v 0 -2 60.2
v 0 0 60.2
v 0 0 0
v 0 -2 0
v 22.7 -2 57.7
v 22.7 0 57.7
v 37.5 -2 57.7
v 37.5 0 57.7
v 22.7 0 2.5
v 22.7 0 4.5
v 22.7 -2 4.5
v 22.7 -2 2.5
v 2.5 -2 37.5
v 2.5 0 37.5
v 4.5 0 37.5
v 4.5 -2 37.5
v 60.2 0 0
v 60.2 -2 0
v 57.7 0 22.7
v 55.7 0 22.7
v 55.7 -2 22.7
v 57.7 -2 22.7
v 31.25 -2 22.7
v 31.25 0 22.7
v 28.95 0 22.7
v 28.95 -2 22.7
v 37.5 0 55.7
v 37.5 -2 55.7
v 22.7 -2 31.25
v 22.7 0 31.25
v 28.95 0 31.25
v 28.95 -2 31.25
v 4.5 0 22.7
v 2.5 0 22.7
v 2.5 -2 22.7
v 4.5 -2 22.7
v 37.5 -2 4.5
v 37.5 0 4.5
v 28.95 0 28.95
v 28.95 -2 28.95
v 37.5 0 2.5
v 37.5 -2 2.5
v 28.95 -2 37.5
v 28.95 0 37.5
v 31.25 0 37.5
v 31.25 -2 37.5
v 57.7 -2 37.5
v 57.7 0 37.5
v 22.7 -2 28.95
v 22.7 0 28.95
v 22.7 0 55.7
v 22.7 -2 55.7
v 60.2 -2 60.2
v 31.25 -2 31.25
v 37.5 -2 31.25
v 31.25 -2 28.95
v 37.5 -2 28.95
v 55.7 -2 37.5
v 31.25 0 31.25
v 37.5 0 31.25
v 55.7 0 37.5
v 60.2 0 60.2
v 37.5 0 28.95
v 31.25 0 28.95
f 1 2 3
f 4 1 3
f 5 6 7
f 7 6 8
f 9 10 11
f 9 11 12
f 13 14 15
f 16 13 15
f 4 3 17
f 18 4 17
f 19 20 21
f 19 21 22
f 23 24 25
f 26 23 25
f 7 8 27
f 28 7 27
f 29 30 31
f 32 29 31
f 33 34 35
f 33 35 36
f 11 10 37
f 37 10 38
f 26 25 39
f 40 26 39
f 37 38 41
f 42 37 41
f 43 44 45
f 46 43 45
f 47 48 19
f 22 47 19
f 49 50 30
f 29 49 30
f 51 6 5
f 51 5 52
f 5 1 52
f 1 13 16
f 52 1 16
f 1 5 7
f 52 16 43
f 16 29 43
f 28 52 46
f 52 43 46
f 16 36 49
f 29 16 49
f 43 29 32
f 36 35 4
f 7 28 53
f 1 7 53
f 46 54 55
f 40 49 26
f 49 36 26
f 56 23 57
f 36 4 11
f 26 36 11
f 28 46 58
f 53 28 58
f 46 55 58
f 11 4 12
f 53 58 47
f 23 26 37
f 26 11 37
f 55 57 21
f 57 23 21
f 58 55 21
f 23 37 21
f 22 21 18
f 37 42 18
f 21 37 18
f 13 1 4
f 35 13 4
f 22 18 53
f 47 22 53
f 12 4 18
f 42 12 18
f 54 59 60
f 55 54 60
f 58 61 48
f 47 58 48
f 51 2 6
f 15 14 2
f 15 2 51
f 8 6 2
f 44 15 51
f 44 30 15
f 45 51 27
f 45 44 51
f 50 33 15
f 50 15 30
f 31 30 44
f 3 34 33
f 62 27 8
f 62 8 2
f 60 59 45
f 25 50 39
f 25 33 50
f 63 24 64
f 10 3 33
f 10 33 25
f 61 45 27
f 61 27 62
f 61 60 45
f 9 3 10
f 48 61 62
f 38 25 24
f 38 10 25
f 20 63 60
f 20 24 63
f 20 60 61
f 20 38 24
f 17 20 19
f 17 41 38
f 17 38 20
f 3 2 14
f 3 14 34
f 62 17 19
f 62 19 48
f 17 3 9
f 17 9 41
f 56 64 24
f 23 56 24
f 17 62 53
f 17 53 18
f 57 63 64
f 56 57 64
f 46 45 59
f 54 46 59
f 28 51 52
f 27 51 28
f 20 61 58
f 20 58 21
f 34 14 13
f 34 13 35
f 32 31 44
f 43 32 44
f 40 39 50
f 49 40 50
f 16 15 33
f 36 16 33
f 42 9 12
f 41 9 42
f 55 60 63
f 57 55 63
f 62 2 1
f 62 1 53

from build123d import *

# Parameters (mm, degrees)
CROQUIS1_W              = 60.2
CROQUIS1_H              = 60.2
SALIENTE_EXTRUIR2_DEPTH = 2
CROQUIS1_5_W            = 14.8
CROQUIS1_5_H            = 2
CROQUIS1_5_W_2          = 2
CROQUIS1_5_H_2          = 14.8
CORTAR_EXTRUIR1_DEPTH   = 10


with BuildPart() as part:
    # Croquis1 → Saliente-Extruir2 (new body)
    with BuildSketch(Plane(origin=(0, 0, 0), x_dir=(1, 0, 0), z_dir=(0, 1, 0))):
        with Locations((30.1, -30.1)):
            Rectangle(CROQUIS1_W, CROQUIS1_H)
    extrude(amount=-SALIENTE_EXTRUIR2_DEPTH)

    # Croquis1_5 → Cortar-Extruir1 (cut)
    with BuildSketch(Plane(origin=(0, 0, 0), x_dir=(1, 0, 0), z_dir=(0, 1, 0))):
        with Locations((30.1, -56.7)):
            Rectangle(CROQUIS1_5_W, CROQUIS1_5_H)
        with Locations((30.1, -3.5)):
            Rectangle(CROQUIS1_5_W, CROQUIS1_5_H)
        with Locations((3.5, -30.1)):
            Rectangle(CROQUIS1_5_W_2, CROQUIS1_5_H_2)
        with Locations((56.7, -30.1)):
            Rectangle(CROQUIS1_5_W_2, CROQUIS1_5_H_2)
        Polygon((28.95, -22.7), (28.95, -28.95), (22.7, -28.95), (22.7, -31.25), (28.95, -31.25), (28.95, -37.5), (31.25, -37.5), (31.25, -31.25), (37.5, -31.25), (37.5, -28.95), (31.25, -28.95), (31.25, -22.7), align=None)
    extrude(amount=-CORTAR_EXTRUIR1_DEPTH, mode=Mode.SUBTRACT)


solid = part.part
